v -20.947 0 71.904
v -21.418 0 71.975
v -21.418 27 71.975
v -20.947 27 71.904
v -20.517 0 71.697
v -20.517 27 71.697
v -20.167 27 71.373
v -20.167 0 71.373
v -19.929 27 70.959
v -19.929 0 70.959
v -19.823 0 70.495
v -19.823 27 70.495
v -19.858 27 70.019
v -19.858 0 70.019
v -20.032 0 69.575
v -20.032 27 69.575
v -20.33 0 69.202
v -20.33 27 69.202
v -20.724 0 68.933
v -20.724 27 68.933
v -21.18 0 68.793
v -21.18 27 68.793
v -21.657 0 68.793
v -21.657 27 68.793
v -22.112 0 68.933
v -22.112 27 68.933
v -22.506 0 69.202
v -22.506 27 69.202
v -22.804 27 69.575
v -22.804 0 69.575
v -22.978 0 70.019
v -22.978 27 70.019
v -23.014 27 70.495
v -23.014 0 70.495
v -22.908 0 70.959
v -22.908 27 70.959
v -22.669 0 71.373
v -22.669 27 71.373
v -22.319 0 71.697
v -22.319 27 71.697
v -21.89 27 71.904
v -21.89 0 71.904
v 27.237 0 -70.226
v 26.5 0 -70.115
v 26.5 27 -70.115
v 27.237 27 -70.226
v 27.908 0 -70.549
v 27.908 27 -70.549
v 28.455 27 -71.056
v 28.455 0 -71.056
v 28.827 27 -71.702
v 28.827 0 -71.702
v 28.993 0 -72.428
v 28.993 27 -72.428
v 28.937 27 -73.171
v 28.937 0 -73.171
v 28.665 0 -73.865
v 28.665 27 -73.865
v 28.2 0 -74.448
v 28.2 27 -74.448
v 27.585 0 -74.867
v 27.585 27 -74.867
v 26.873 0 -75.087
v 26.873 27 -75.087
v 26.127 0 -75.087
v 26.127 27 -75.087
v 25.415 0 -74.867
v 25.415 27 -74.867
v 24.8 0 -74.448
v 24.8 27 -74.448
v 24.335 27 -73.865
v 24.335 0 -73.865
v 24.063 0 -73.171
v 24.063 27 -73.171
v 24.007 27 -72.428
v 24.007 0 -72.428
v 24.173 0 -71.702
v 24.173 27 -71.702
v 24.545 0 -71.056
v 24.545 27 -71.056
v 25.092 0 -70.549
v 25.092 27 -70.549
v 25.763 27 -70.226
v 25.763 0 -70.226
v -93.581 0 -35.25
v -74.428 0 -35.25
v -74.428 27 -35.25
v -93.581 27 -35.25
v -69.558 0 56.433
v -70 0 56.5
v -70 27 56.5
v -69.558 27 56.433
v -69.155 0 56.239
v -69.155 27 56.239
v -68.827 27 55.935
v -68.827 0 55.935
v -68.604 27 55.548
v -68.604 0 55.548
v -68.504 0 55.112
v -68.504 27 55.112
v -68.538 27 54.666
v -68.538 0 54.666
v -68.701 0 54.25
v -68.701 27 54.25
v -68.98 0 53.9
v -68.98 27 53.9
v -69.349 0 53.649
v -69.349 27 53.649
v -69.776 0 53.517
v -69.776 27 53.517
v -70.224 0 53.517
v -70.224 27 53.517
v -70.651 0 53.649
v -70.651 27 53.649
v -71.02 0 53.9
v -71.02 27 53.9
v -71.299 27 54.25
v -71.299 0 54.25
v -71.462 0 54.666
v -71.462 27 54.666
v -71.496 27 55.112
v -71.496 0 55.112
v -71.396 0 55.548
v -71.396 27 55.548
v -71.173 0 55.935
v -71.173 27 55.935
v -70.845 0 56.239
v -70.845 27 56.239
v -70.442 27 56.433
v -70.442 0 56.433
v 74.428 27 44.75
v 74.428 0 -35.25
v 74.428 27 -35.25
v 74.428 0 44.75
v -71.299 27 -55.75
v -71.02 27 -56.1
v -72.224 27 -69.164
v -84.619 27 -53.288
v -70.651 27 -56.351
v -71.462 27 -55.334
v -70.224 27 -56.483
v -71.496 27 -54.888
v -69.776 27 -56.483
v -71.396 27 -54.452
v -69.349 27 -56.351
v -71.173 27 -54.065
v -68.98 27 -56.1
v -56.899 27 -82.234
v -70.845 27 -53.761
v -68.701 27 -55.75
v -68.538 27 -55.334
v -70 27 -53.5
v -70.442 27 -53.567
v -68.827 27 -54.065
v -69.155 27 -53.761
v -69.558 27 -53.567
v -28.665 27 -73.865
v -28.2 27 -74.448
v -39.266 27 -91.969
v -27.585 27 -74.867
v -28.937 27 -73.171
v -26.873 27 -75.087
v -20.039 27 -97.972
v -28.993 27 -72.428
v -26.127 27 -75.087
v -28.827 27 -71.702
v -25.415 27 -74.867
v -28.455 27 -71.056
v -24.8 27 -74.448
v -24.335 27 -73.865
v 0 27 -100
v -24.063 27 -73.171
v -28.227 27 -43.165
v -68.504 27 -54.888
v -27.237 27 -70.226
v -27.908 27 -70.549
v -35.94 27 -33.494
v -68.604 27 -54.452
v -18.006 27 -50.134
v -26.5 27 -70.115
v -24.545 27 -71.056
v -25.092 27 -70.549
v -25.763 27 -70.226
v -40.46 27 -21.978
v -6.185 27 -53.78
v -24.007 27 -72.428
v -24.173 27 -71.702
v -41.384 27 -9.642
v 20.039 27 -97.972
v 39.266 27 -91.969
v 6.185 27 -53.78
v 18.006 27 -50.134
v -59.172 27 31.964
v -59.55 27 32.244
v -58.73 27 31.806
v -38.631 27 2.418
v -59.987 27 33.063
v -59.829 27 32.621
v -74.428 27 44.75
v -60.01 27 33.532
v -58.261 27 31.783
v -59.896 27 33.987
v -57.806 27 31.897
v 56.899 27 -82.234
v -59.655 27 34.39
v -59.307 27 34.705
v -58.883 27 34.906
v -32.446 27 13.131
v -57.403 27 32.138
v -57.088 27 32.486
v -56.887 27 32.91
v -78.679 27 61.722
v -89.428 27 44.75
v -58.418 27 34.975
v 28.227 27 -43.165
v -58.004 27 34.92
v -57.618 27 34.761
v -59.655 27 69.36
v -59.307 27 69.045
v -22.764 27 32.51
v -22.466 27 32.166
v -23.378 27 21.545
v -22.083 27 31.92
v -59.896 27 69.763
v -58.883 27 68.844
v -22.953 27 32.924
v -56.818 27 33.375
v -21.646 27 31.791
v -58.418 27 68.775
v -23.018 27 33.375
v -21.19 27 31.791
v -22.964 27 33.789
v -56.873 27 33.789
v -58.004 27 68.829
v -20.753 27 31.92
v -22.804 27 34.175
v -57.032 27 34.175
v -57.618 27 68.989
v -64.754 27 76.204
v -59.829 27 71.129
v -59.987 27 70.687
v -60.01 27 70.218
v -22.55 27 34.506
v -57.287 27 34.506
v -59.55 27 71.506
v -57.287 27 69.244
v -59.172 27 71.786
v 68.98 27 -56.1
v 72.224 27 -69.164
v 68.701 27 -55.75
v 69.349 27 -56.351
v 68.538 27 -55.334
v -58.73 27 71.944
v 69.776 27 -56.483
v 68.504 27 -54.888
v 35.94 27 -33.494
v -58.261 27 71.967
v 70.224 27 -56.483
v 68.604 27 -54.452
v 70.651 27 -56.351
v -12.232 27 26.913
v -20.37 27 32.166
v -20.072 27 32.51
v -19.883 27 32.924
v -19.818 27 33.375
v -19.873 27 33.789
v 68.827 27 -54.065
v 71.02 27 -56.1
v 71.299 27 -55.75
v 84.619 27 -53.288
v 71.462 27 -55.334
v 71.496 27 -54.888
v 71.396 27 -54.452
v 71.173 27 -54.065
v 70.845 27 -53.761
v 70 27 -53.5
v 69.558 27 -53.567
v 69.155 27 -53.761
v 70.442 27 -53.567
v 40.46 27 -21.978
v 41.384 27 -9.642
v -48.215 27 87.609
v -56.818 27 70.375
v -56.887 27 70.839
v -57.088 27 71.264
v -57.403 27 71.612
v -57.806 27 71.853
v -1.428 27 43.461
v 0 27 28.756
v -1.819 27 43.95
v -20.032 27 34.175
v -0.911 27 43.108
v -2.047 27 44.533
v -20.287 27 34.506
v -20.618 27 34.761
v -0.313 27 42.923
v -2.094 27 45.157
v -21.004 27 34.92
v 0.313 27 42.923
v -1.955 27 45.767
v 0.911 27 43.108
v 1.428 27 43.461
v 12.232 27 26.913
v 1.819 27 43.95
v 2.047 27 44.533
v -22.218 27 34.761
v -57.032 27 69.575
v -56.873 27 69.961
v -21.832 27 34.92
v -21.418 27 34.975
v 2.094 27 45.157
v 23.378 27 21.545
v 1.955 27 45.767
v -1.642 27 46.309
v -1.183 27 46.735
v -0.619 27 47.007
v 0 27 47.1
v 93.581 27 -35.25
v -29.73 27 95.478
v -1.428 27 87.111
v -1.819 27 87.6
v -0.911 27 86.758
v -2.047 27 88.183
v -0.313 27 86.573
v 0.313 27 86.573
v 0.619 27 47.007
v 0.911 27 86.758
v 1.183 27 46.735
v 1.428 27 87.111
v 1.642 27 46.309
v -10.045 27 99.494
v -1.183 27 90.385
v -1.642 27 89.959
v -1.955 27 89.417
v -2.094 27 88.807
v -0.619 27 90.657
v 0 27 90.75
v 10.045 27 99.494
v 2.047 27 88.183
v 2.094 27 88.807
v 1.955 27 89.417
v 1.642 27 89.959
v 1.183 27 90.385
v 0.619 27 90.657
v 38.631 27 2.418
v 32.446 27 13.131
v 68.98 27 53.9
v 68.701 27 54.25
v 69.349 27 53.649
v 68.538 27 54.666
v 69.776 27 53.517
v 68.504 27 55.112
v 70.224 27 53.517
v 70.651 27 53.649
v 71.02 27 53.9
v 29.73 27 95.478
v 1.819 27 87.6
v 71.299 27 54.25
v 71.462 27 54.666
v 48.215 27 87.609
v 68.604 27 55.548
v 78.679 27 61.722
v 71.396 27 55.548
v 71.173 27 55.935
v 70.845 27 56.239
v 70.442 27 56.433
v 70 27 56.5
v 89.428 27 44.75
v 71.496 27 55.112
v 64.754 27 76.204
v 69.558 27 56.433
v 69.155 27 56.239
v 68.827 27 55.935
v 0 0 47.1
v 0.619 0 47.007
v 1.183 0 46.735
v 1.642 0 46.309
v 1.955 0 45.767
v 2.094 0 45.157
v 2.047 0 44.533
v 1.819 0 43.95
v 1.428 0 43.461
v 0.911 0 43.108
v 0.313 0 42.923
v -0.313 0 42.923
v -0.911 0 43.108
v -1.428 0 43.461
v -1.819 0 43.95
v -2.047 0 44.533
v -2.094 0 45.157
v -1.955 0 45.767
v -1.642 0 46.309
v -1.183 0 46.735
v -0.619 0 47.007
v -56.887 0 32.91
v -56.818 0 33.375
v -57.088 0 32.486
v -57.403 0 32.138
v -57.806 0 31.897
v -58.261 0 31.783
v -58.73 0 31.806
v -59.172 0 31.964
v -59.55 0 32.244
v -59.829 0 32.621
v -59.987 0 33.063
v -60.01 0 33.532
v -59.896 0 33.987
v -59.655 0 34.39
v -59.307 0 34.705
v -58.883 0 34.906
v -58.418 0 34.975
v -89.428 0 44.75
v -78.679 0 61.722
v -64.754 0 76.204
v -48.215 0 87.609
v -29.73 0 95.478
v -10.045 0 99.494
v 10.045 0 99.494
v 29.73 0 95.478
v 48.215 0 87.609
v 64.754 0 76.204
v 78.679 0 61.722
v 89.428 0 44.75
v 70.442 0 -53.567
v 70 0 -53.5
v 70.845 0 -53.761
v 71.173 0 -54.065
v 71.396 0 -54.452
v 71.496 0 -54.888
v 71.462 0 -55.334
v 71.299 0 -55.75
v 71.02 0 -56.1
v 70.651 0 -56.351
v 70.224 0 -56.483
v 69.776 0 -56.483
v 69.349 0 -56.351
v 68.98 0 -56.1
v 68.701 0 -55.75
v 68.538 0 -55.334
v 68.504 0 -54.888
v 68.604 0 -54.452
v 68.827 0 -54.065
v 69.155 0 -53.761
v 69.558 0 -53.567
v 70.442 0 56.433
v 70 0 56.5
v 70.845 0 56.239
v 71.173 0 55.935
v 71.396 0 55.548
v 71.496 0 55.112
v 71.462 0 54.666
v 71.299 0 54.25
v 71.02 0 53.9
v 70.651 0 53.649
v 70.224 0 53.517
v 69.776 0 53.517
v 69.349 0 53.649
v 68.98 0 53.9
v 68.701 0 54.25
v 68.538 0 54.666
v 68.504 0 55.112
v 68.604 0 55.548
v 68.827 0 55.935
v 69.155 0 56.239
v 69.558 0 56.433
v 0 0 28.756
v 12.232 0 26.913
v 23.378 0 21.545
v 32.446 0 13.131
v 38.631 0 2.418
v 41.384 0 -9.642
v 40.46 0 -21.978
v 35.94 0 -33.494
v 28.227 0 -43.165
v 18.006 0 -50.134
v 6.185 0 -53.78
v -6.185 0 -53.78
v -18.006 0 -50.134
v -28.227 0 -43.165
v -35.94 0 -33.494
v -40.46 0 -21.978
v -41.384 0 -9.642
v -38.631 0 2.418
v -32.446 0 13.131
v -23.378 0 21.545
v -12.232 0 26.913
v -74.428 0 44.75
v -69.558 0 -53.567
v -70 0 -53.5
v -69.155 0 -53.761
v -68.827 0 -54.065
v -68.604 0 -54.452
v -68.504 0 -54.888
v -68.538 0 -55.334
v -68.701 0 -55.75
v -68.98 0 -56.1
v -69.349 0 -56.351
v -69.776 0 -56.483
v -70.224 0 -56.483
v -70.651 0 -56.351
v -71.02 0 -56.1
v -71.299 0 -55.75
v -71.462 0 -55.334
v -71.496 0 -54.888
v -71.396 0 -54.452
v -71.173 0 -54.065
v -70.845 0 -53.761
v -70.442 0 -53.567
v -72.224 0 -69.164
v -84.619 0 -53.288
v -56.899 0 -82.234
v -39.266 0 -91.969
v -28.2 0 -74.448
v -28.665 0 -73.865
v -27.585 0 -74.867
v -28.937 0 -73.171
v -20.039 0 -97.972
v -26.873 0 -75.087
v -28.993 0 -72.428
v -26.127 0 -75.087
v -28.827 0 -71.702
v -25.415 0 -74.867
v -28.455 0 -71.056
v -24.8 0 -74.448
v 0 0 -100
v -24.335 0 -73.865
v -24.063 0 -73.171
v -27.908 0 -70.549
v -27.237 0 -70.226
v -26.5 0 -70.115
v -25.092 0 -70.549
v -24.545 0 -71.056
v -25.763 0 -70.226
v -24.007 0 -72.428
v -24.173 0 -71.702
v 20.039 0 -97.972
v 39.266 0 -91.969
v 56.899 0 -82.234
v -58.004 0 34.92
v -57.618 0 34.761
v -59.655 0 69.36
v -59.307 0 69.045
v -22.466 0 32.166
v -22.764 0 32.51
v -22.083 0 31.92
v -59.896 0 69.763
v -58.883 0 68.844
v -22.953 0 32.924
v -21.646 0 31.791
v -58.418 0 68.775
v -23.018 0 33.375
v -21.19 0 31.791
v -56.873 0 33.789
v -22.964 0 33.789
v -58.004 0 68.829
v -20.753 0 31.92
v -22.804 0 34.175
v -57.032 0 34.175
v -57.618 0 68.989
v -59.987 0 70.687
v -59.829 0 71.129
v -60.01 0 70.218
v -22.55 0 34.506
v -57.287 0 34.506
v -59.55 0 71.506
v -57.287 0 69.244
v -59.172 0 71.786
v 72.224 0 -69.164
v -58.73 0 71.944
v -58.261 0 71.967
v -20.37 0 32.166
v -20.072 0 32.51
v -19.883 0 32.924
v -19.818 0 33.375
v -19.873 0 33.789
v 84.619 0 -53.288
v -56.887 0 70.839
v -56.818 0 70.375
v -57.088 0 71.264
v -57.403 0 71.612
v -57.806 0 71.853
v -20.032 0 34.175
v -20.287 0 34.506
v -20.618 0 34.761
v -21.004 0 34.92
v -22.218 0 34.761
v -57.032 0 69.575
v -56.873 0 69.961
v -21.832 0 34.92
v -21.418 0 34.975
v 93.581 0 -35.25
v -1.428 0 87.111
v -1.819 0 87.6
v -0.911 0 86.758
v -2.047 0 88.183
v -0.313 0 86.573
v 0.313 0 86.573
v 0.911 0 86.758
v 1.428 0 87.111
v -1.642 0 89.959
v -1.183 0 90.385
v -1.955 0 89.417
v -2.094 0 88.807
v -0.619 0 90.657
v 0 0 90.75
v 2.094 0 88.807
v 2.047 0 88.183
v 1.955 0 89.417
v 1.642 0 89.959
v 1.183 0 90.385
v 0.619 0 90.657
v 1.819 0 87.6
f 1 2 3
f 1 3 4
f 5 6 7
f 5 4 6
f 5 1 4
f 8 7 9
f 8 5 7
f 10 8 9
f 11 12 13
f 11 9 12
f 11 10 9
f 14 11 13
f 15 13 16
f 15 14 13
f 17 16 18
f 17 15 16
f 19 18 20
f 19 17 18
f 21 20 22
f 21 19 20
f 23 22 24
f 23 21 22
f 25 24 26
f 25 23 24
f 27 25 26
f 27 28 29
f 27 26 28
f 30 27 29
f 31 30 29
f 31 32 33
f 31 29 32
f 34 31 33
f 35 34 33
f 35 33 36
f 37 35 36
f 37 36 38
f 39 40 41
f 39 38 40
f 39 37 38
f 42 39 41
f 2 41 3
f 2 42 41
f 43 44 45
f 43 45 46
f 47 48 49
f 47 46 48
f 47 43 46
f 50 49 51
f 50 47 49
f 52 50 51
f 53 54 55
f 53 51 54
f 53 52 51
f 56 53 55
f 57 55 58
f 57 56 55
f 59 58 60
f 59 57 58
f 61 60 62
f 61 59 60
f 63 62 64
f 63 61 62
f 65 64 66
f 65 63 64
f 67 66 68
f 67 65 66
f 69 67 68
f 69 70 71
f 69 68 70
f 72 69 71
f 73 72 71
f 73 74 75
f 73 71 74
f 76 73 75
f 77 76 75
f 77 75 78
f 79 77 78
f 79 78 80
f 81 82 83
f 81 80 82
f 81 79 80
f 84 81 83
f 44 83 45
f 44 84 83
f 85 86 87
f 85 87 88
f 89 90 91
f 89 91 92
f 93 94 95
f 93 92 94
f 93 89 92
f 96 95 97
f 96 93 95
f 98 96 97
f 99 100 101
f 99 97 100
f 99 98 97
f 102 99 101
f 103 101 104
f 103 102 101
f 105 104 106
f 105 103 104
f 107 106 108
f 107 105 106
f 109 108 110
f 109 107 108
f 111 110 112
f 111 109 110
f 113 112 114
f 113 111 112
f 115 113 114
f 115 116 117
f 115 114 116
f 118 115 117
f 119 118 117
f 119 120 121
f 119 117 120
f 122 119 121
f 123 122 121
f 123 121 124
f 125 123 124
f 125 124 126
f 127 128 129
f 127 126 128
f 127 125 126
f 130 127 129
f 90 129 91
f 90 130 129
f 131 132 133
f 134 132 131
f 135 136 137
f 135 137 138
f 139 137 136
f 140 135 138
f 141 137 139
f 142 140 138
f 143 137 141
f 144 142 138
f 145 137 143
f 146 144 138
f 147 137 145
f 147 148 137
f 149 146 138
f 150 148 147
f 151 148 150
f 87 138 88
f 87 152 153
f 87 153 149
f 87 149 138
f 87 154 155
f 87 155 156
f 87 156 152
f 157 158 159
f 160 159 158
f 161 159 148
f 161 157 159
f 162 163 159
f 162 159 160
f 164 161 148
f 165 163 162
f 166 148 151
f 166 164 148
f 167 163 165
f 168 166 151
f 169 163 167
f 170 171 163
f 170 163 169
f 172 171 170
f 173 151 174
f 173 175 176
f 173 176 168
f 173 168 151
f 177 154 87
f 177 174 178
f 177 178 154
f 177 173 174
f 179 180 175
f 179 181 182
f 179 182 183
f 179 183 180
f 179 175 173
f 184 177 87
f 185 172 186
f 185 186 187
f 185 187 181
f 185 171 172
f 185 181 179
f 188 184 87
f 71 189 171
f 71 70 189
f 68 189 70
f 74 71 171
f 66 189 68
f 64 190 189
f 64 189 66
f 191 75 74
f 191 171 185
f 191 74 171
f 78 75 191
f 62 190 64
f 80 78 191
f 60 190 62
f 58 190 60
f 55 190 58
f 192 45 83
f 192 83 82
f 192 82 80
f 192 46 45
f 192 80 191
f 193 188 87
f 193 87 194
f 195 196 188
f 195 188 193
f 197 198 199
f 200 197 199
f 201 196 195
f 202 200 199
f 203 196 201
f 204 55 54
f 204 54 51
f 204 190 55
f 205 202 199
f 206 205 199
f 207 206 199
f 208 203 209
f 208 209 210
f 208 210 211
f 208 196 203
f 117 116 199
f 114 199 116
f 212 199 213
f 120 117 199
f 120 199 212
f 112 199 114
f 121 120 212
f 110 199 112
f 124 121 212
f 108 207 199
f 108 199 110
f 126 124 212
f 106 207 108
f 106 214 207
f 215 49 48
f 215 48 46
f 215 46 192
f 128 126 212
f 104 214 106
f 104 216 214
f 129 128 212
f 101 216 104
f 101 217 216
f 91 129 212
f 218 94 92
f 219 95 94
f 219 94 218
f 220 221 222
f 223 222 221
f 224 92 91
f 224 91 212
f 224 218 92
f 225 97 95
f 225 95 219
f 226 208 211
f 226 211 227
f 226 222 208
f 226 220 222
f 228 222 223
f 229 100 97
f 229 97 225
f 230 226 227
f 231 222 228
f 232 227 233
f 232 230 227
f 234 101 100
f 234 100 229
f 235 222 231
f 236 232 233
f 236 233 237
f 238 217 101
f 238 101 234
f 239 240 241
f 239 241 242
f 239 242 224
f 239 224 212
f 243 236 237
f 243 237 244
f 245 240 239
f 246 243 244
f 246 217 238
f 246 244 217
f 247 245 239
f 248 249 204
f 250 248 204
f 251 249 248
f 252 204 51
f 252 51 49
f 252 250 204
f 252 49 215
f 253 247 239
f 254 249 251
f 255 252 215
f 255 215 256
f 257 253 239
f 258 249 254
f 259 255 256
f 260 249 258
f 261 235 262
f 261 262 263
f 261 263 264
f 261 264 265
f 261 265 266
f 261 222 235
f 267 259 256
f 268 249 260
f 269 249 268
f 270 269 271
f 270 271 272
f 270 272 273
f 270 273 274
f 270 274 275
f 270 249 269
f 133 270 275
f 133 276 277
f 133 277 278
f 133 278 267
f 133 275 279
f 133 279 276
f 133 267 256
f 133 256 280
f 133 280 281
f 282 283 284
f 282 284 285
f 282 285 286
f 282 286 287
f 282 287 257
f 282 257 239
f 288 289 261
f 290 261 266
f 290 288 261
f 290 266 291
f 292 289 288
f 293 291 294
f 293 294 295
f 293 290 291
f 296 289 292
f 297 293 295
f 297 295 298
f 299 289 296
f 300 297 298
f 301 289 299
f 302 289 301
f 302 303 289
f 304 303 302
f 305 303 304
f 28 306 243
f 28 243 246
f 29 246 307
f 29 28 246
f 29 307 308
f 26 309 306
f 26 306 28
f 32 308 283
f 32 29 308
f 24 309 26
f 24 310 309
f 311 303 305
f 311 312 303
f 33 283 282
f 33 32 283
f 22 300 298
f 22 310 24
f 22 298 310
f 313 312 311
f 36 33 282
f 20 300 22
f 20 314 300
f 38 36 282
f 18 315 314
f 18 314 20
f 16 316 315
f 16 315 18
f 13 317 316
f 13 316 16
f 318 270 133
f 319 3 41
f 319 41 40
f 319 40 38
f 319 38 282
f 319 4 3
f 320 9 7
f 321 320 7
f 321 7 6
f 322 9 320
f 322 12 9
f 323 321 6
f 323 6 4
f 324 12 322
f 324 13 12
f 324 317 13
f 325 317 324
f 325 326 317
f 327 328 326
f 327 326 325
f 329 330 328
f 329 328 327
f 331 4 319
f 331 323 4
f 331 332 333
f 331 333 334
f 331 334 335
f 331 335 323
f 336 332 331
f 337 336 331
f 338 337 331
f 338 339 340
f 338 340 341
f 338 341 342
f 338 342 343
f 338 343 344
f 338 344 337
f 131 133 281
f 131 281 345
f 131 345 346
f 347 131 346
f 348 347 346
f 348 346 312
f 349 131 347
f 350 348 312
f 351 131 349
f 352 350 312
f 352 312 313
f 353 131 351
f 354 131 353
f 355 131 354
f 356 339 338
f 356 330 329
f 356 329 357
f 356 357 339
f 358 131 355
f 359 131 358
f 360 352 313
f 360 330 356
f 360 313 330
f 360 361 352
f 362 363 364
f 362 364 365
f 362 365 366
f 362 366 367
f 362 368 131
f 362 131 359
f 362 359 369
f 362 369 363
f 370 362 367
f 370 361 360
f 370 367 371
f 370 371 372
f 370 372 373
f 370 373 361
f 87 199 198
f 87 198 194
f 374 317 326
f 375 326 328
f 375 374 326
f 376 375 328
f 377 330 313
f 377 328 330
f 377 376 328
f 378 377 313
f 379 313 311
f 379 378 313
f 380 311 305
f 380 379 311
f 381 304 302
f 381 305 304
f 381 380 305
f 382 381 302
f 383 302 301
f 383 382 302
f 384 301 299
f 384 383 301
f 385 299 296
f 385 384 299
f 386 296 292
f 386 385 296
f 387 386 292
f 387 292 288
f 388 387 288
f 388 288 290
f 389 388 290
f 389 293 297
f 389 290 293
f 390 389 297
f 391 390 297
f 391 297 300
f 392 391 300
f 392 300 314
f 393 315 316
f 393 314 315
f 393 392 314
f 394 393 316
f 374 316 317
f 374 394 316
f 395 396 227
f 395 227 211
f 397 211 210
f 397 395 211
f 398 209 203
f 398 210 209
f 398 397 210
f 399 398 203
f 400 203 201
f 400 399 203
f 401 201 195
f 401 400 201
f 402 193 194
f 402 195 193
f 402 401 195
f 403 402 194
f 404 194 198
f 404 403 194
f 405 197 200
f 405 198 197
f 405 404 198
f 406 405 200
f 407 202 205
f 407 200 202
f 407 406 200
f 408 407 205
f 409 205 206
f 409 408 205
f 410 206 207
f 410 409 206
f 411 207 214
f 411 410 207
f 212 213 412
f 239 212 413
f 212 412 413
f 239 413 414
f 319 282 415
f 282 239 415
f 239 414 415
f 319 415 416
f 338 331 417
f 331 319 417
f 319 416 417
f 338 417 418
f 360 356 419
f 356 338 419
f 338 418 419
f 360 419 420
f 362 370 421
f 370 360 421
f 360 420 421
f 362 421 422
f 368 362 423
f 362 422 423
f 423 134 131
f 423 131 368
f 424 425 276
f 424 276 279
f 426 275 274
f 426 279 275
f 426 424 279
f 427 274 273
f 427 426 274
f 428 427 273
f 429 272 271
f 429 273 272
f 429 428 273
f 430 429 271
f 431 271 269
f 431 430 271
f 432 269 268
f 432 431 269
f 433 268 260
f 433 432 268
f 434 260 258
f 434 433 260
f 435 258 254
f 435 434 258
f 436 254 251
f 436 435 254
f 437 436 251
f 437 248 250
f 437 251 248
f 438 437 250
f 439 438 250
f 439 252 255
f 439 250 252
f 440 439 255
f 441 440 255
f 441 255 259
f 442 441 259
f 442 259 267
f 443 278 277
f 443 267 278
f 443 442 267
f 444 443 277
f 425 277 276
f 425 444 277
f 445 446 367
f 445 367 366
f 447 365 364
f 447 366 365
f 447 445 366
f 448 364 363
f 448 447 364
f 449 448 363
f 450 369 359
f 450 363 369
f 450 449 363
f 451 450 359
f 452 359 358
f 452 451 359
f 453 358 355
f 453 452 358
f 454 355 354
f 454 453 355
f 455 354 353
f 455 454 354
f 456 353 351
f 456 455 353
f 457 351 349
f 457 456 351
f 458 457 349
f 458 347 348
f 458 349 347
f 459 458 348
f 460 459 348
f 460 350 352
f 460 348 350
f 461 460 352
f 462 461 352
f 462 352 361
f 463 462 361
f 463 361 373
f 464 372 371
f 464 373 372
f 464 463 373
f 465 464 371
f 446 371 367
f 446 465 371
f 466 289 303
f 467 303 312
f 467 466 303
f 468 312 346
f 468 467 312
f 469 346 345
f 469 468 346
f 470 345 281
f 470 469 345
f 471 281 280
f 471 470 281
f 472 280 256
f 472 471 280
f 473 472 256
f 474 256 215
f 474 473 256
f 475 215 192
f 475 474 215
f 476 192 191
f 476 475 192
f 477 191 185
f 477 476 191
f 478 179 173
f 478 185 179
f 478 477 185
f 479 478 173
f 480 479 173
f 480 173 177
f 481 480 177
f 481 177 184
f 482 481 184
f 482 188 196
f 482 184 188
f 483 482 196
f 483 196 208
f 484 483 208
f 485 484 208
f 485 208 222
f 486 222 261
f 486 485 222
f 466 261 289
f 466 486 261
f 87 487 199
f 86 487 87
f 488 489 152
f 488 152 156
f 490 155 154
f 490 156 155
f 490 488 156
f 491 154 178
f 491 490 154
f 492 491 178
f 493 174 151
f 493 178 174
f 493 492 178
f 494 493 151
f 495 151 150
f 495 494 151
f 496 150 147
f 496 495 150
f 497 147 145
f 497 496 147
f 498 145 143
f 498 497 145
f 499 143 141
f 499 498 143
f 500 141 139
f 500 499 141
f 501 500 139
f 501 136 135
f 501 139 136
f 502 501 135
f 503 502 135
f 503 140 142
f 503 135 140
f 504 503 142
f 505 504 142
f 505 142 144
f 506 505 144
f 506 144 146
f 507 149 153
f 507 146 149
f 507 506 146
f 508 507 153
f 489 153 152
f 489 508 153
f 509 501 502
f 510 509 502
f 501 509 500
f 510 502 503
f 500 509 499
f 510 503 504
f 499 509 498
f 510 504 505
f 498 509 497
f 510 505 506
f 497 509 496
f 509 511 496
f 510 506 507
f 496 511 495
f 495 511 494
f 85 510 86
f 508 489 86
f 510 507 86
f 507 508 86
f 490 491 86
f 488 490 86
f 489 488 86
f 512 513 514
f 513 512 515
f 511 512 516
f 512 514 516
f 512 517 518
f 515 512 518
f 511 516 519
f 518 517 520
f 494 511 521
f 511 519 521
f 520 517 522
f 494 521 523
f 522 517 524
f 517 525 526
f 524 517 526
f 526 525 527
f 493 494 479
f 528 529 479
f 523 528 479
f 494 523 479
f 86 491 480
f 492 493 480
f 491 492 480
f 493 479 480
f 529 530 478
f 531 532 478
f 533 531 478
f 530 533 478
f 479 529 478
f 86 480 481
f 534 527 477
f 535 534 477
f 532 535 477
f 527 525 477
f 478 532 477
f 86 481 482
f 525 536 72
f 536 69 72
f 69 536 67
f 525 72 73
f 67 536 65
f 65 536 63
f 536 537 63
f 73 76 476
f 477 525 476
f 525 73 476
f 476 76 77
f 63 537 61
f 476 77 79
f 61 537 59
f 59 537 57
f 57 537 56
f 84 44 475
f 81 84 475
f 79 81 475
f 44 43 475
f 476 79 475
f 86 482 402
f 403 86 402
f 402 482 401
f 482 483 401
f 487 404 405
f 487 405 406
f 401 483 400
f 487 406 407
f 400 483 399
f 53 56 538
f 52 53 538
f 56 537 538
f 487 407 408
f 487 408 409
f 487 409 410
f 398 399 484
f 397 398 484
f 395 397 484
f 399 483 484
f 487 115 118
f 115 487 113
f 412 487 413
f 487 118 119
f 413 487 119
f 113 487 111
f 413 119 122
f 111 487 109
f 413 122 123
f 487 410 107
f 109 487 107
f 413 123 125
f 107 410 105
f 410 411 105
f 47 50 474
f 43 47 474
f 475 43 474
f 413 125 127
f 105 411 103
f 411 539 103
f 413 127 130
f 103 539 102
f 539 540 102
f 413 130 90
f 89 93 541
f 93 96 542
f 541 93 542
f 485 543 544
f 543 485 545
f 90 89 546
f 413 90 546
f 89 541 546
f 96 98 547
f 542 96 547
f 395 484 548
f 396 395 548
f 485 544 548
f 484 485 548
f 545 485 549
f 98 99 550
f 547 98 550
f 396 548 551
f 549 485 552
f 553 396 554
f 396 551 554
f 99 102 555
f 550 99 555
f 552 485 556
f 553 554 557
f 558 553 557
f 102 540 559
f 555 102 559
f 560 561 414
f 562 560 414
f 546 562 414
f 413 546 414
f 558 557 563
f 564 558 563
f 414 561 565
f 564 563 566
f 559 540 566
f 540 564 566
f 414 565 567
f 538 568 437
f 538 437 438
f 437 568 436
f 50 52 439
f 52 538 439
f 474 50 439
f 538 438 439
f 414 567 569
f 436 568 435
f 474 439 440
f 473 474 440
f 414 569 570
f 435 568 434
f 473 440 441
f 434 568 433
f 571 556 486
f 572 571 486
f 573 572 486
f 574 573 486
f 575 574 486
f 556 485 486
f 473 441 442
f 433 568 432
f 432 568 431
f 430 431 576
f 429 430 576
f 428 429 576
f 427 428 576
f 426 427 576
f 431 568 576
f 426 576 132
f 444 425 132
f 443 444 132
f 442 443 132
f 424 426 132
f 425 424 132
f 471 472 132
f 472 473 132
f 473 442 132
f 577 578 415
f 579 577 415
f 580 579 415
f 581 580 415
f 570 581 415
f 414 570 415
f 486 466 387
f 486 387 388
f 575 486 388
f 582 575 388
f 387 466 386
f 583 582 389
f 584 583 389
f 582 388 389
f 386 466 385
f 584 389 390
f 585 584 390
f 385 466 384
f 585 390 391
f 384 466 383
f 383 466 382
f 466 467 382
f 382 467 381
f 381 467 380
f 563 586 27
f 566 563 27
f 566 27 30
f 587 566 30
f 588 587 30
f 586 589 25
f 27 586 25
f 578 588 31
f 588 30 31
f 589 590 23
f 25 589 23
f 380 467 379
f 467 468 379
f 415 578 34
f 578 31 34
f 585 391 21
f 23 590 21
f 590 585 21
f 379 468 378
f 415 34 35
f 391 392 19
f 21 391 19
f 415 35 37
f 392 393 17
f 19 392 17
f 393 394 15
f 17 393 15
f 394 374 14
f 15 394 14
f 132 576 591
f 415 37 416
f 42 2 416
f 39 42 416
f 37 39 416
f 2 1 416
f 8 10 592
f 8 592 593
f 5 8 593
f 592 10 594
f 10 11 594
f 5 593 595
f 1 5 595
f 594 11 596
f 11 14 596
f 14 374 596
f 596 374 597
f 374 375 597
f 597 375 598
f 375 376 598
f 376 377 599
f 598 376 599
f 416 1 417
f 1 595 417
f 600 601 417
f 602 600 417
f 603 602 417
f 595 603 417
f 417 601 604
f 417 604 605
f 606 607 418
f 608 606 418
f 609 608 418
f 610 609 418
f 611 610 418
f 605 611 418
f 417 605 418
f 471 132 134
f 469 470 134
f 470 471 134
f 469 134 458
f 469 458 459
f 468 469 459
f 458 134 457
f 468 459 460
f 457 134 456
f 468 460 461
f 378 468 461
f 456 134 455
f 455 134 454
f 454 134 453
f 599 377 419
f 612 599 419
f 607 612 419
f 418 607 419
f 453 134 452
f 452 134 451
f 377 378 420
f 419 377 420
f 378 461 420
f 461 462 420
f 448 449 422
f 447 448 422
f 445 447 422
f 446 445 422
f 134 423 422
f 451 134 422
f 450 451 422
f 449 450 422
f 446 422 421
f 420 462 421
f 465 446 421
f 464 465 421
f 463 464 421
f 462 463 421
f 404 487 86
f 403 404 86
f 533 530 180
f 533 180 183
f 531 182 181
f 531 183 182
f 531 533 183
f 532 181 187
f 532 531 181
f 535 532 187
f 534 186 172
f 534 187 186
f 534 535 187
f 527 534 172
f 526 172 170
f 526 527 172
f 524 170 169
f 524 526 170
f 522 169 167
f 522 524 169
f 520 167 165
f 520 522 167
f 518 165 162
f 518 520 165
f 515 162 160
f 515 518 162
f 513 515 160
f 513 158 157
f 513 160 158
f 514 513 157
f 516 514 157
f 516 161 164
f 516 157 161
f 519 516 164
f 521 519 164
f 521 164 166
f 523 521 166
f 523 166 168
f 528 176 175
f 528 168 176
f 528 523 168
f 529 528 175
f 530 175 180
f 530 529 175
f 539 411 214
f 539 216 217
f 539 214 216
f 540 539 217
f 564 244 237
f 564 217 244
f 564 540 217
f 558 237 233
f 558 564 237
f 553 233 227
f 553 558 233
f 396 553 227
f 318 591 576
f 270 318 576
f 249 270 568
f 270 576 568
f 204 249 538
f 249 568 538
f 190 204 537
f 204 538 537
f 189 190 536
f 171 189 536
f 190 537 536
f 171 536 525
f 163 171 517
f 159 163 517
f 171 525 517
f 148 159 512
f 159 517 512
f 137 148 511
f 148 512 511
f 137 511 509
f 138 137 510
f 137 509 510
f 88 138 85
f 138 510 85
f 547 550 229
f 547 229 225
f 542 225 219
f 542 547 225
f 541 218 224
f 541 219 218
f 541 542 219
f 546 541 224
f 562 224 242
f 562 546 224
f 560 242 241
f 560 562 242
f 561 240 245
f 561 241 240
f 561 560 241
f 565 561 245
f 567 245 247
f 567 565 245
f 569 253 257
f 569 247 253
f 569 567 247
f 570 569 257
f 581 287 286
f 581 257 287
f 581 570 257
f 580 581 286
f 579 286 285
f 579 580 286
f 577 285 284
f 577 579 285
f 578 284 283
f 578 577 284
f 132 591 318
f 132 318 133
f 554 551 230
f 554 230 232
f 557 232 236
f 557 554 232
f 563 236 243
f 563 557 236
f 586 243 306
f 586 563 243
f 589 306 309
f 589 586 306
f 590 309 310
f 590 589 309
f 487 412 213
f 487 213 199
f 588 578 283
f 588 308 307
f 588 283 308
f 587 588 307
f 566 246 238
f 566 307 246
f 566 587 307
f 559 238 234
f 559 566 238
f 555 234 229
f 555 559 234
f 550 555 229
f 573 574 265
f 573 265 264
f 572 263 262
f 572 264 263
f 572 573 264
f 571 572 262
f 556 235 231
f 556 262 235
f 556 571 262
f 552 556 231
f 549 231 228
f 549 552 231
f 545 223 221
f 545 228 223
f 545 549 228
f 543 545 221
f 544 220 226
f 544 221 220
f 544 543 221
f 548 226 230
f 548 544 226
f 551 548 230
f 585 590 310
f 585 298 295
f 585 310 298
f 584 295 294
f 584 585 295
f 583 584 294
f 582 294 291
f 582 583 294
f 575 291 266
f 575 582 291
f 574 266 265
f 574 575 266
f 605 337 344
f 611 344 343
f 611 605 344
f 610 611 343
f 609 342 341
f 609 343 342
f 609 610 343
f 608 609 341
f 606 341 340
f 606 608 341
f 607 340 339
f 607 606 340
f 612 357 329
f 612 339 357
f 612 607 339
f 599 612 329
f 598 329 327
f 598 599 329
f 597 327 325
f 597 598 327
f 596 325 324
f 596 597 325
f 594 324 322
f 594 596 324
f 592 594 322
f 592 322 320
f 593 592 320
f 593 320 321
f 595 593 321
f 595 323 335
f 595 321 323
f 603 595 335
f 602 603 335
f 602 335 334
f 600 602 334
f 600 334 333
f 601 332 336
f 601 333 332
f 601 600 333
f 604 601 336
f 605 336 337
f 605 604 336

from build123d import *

# Parameters (mm, degrees)
SKETCH_2_R               = 100
EXTRUDE_1_DEPTH          = 27
CUT_EXTRUDE_1_DEPTH      = 144.975692393
CUT_EXTRUDE_1_DEPTH_BACK = 10
SKETCH_2_8_R             = 41.5
CUT_EXTRUDE_4_DEPTH      = 140.593830451
CUT_EXTRUDE_7_DEPTH      = 140.593830451
CUT_EXTRUDE_7_DEPTH_BACK = 10
SKETCH_2_11_R            = 2.1
CUT_EXTRUDE_8_DEPTH      = 140.593830451
CUT_EXTRUDE_8_DEPTH_BACK = 140.593830451
SKETCH_6_R               = 1.6
SKETCH_6_R_2             = 1.5
CUT_EXTRUDE_9_DEPTH      = 140.593830451
CUT_EXTRUDE_9_DEPTH_BACK = 140.593830451
SKETCH_7_R               = 2.5


with BuildPart() as part:
    # 草圖2 → 填料-伸長1 (new body)
    with BuildSketch(Plane(origin=(0, 0, 0), x_dir=(1, 0, 0), z_dir=(0, 1, 0))):
        Circle(SKETCH_2_R)
    extrude(amount=EXTRUDE_1_DEPTH)

    # 草圖2<5> → 除料-伸長1 (cut, two sides: drawn at the far end of the back side and taken through both)
    with BuildSketch(Plane(origin=(0, 0, 0), x_dir=(1, 0, 0), z_dir=(0, 1, 0)).offset(-CUT_EXTRUDE_1_DEPTH_BACK)):
        with BuildLine():
            Line((93.581181335, 35.25), (74.428393142, 35.25))
            Line((74.428393142, 35.25), (74.428393142, -44.75))
            Line((74.428393142, -44.75), (89.428393142, -44.75))
            ThreePointArc((89.428393142, -44.75), (99.86554004, -5.184005444), (93.581181335, 35.25))
        make_face()
        with BuildLine():
            Line((-74.428393142, 35.25), (-93.581181335, 35.25))
            ThreePointArc((-93.581181335, 35.25), (-99.86554004, -5.184005444), (-89.428393142, -44.75))
            Line((-89.428393142, -44.75), (-74.428393142, -44.75))
            Line((-74.428393142, -44.75), (-74.428393142, 35.25))
        make_face()
    extrude(amount=CUT_EXTRUDE_1_DEPTH + CUT_EXTRUDE_1_DEPTH_BACK, mode=Mode.SUBTRACT)

    # 草圖2<8> → 除料-伸長4 (cut, through all)
    with BuildSketch(Plane(origin=(0, 0, 0), x_dir=(1, 0, 0), z_dir=(0, 1, 0))):
        with Locations((0, 12.743545883)):
            Circle(SKETCH_2_8_R)
    extrude(amount=CUT_EXTRUDE_4_DEPTH, mode=Mode.SUBTRACT)

    # 草圖2<11> → 除料-伸長7 (cut, two sides: drawn at the far end of the back side and taken through both)
    with BuildSketch(Plane(origin=(0, 0, 0), x_dir=(1, 0, 0), z_dir=(0, 1, 0)).offset(-CUT_EXTRUDE_7_DEPTH_BACK)):
        with Locations((0, -45)):
            Circle(SKETCH_2_11_R)
        with Locations((0, -88.65)):
            Circle(SKETCH_2_11_R)
    extrude(amount=CUT_EXTRUDE_7_DEPTH + CUT_EXTRUDE_7_DEPTH_BACK, mode=Mode.SUBTRACT)

    # 草圖6 → 除料-伸長8 (cut, two sides: drawn at the far end of the back side and taken through both)
    with BuildSketch(Plane(origin=(0, 27, 0), x_dir=(1, 0, 0), z_dir=(0, 1, 0)).offset(-CUT_EXTRUDE_8_DEPTH_BACK)):
        with Locations((-58.41813564, -33.374946877)):
            Circle(SKETCH_6_R)
        with Locations((-21.41813564, -33.374946877)):
            Circle(SKETCH_6_R)
        with Locations((-58.41813564, -70.374946877)):
            Circle(SKETCH_6_R)
        with Locations((-21.41813564, -70.374946877)):
            Circle(SKETCH_6_R)
        with Locations((-70, -55)):
            Circle(SKETCH_6_R_2)
        with Locations((-70, 55)):
            Circle(SKETCH_6_R_2)
        with Locations((70, -55)):
            Circle(SKETCH_6_R_2)
        with Locations((70, 55)):
            Circle(SKETCH_6_R_2)
    extrude(amount=CUT_EXTRUDE_8_DEPTH + CUT_EXTRUDE_8_DEPTH_BACK, mode=Mode.SUBTRACT)

    # 草圖7 → 除料-伸長9 (cut, two sides: drawn at the far end of the back side and taken through both)
    with BuildSketch(Plane(origin=(0, 27, 0), x_dir=(1, 0, 0), z_dir=(0, 1, 0)).offset(-CUT_EXTRUDE_9_DEPTH_BACK)):
        with Locations((-26.5, 72.61491789)):
            Circle(SKETCH_7_R)
        with Locations((26.5, 72.61491789)):
            Circle(SKETCH_7_R)
    extrude(amount=CUT_EXTRUDE_9_DEPTH + CUT_EXTRUDE_9_DEPTH_BACK, mode=Mode.SUBTRACT)


solid = part.part
